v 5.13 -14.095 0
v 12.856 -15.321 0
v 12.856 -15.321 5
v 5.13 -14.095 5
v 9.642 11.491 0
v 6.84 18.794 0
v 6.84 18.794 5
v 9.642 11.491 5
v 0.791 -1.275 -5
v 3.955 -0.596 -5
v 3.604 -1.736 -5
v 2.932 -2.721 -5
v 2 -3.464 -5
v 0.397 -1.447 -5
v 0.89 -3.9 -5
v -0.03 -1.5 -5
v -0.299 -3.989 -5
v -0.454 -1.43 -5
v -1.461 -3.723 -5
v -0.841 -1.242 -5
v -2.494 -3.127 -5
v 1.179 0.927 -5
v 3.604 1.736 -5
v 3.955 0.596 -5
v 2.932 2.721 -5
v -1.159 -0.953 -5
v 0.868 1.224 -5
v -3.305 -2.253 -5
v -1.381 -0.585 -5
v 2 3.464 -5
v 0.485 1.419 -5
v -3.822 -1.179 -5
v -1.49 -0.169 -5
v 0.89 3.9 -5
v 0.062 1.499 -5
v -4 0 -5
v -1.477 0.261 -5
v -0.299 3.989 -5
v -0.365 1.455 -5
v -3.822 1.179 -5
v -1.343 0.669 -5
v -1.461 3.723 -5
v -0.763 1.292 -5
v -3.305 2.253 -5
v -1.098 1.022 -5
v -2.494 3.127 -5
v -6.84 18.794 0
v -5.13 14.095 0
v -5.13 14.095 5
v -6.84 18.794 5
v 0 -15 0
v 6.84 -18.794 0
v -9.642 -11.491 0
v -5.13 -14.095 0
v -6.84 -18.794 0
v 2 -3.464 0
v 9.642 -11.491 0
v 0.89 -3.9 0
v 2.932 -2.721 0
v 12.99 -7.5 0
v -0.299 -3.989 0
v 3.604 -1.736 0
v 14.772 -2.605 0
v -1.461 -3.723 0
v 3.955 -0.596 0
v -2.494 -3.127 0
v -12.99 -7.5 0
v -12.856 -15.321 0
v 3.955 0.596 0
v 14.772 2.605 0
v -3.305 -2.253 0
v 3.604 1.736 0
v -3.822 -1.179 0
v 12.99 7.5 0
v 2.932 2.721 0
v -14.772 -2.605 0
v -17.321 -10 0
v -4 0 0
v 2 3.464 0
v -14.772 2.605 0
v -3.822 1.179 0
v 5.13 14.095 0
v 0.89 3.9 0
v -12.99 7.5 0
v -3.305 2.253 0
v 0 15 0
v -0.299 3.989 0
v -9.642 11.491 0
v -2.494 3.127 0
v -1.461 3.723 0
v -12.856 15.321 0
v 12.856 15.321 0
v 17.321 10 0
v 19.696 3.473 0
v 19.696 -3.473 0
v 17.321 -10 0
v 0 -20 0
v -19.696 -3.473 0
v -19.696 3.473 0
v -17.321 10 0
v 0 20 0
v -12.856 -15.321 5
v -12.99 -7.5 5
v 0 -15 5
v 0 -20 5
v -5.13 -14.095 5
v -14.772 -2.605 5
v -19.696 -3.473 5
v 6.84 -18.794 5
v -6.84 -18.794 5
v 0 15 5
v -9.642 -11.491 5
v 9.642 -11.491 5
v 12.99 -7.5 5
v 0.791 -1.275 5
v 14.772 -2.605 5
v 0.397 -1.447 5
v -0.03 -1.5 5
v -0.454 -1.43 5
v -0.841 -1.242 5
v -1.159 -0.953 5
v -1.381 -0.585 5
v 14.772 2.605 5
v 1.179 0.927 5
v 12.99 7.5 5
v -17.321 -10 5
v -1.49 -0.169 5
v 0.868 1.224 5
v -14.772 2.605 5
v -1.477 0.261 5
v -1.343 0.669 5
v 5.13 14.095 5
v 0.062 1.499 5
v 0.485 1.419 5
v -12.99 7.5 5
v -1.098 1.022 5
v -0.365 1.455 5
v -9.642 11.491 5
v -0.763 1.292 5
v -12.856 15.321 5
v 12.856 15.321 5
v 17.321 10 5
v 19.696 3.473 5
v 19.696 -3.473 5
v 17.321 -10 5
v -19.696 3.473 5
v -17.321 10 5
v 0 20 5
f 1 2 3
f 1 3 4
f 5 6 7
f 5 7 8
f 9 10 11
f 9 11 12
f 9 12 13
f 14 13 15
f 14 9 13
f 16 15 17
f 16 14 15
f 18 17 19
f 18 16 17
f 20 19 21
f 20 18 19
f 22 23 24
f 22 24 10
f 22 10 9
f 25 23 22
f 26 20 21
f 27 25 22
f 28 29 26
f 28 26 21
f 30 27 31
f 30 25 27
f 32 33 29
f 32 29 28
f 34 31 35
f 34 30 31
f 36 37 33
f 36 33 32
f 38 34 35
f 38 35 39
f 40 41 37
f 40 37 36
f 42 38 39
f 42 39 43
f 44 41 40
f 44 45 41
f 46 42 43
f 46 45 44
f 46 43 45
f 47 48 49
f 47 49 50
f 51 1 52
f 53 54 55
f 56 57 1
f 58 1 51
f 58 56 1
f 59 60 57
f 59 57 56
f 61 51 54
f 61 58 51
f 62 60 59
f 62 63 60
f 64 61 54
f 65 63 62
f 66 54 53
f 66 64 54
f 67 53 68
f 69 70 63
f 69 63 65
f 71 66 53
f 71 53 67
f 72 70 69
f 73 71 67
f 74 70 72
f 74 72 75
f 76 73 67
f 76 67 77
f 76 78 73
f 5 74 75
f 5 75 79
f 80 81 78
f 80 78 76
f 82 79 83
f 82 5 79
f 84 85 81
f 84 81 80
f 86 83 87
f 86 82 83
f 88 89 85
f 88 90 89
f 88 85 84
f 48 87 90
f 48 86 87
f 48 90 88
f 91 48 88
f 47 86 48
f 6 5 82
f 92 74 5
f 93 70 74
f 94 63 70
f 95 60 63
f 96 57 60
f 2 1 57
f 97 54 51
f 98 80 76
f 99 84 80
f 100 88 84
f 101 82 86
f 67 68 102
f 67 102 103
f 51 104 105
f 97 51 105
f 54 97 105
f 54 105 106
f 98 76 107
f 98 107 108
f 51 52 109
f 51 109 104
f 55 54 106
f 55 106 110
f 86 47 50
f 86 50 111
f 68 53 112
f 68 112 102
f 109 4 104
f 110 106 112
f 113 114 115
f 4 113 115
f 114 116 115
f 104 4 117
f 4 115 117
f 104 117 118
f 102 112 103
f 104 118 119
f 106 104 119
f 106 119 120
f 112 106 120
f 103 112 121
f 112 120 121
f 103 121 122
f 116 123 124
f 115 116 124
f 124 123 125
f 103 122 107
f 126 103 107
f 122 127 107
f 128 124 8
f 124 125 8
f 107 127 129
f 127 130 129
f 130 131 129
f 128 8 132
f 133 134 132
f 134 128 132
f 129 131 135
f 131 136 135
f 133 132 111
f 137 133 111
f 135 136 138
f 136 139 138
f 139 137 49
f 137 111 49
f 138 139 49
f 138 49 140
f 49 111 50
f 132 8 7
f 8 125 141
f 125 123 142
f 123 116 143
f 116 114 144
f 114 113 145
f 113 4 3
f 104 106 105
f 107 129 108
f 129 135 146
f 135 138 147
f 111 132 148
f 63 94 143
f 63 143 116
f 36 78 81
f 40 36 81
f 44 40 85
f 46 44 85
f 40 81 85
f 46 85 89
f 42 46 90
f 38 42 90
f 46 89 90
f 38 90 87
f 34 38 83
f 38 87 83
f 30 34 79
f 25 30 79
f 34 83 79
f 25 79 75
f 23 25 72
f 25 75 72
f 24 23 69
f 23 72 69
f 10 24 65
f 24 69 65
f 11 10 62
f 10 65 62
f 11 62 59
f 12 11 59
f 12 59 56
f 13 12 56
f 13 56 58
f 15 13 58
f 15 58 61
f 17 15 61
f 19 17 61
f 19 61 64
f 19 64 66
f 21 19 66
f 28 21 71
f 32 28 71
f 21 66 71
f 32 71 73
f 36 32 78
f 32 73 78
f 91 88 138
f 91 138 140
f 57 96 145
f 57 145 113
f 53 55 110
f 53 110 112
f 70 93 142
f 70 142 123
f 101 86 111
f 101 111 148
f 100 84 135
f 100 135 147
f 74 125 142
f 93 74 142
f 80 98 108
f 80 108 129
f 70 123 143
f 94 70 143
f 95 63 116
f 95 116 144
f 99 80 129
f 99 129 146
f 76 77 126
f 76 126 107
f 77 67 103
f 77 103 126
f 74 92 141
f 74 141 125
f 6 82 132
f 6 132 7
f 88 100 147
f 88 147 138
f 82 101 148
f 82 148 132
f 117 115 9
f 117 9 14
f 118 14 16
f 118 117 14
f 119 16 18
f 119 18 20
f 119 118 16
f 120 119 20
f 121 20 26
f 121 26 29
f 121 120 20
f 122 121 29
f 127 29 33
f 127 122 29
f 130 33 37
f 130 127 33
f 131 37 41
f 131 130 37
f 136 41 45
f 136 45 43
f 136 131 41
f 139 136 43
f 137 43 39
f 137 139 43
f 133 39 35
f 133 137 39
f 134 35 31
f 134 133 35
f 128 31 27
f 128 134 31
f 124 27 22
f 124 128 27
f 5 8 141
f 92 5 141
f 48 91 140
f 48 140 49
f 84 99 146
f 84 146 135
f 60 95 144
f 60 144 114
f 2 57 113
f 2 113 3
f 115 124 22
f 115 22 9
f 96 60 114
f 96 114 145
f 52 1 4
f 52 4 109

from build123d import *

# Parameters (mm, degrees)
BOSS_EXTRUDE1_DEPTH = 5
CIRPATTERN1_COUNT   = 18
SKETCH7_R           = 4
BOSS_EXTRUDE3_DEPTH = 5
CUT_EXTRUDE1_DEPTH  = 10


with BuildPart() as part:
    # Sketch1 → Boss-Extrude1 (new body)
    with BuildSketch(Plane.XY):
        Polygon((0, 0), (0, 20), (5.13030215, 14.095389312), align=None)
    boss_extrude1 = extrude(amount=BOSS_EXTRUDE1_DEPTH)

    # CirPattern1: Boss-Extrude1 ×18 about axis
    cirpattern1_axis = Axis((0, 0, 0), (0, 0, 1))
    for i in range(1, CIRPATTERN1_COUNT):
        add(boss_extrude1.rotate(cirpattern1_axis, i * 360 / CIRPATTERN1_COUNT))

    # Sketch7 → Boss-Extrude3 (add)
    with BuildSketch(Plane(origin=(0, 0, 0), x_dir=(-1, 0, 0), z_dir=(0, 0, -1))):
        Circle(SKETCH7_R)
    extrude(amount=BOSS_EXTRUDE3_DEPTH)

    # Sketch5 → Cut-Extrude1 (cut)
    with BuildSketch(Plane.XY.offset(5)):
        with BuildLine():
            Line((1.17901122, 0.927325479), (0.790582224, -1.274746935))
            ThreePointArc((0.790582224, -1.274746935), (-1.477195083, 0.260566092), (1.17901122, 0.927325479))
        make_face()
    extrude(amount=-CUT_EXTRUDE1_DEPTH, mode=Mode.SUBTRACT)


solid = part.part
